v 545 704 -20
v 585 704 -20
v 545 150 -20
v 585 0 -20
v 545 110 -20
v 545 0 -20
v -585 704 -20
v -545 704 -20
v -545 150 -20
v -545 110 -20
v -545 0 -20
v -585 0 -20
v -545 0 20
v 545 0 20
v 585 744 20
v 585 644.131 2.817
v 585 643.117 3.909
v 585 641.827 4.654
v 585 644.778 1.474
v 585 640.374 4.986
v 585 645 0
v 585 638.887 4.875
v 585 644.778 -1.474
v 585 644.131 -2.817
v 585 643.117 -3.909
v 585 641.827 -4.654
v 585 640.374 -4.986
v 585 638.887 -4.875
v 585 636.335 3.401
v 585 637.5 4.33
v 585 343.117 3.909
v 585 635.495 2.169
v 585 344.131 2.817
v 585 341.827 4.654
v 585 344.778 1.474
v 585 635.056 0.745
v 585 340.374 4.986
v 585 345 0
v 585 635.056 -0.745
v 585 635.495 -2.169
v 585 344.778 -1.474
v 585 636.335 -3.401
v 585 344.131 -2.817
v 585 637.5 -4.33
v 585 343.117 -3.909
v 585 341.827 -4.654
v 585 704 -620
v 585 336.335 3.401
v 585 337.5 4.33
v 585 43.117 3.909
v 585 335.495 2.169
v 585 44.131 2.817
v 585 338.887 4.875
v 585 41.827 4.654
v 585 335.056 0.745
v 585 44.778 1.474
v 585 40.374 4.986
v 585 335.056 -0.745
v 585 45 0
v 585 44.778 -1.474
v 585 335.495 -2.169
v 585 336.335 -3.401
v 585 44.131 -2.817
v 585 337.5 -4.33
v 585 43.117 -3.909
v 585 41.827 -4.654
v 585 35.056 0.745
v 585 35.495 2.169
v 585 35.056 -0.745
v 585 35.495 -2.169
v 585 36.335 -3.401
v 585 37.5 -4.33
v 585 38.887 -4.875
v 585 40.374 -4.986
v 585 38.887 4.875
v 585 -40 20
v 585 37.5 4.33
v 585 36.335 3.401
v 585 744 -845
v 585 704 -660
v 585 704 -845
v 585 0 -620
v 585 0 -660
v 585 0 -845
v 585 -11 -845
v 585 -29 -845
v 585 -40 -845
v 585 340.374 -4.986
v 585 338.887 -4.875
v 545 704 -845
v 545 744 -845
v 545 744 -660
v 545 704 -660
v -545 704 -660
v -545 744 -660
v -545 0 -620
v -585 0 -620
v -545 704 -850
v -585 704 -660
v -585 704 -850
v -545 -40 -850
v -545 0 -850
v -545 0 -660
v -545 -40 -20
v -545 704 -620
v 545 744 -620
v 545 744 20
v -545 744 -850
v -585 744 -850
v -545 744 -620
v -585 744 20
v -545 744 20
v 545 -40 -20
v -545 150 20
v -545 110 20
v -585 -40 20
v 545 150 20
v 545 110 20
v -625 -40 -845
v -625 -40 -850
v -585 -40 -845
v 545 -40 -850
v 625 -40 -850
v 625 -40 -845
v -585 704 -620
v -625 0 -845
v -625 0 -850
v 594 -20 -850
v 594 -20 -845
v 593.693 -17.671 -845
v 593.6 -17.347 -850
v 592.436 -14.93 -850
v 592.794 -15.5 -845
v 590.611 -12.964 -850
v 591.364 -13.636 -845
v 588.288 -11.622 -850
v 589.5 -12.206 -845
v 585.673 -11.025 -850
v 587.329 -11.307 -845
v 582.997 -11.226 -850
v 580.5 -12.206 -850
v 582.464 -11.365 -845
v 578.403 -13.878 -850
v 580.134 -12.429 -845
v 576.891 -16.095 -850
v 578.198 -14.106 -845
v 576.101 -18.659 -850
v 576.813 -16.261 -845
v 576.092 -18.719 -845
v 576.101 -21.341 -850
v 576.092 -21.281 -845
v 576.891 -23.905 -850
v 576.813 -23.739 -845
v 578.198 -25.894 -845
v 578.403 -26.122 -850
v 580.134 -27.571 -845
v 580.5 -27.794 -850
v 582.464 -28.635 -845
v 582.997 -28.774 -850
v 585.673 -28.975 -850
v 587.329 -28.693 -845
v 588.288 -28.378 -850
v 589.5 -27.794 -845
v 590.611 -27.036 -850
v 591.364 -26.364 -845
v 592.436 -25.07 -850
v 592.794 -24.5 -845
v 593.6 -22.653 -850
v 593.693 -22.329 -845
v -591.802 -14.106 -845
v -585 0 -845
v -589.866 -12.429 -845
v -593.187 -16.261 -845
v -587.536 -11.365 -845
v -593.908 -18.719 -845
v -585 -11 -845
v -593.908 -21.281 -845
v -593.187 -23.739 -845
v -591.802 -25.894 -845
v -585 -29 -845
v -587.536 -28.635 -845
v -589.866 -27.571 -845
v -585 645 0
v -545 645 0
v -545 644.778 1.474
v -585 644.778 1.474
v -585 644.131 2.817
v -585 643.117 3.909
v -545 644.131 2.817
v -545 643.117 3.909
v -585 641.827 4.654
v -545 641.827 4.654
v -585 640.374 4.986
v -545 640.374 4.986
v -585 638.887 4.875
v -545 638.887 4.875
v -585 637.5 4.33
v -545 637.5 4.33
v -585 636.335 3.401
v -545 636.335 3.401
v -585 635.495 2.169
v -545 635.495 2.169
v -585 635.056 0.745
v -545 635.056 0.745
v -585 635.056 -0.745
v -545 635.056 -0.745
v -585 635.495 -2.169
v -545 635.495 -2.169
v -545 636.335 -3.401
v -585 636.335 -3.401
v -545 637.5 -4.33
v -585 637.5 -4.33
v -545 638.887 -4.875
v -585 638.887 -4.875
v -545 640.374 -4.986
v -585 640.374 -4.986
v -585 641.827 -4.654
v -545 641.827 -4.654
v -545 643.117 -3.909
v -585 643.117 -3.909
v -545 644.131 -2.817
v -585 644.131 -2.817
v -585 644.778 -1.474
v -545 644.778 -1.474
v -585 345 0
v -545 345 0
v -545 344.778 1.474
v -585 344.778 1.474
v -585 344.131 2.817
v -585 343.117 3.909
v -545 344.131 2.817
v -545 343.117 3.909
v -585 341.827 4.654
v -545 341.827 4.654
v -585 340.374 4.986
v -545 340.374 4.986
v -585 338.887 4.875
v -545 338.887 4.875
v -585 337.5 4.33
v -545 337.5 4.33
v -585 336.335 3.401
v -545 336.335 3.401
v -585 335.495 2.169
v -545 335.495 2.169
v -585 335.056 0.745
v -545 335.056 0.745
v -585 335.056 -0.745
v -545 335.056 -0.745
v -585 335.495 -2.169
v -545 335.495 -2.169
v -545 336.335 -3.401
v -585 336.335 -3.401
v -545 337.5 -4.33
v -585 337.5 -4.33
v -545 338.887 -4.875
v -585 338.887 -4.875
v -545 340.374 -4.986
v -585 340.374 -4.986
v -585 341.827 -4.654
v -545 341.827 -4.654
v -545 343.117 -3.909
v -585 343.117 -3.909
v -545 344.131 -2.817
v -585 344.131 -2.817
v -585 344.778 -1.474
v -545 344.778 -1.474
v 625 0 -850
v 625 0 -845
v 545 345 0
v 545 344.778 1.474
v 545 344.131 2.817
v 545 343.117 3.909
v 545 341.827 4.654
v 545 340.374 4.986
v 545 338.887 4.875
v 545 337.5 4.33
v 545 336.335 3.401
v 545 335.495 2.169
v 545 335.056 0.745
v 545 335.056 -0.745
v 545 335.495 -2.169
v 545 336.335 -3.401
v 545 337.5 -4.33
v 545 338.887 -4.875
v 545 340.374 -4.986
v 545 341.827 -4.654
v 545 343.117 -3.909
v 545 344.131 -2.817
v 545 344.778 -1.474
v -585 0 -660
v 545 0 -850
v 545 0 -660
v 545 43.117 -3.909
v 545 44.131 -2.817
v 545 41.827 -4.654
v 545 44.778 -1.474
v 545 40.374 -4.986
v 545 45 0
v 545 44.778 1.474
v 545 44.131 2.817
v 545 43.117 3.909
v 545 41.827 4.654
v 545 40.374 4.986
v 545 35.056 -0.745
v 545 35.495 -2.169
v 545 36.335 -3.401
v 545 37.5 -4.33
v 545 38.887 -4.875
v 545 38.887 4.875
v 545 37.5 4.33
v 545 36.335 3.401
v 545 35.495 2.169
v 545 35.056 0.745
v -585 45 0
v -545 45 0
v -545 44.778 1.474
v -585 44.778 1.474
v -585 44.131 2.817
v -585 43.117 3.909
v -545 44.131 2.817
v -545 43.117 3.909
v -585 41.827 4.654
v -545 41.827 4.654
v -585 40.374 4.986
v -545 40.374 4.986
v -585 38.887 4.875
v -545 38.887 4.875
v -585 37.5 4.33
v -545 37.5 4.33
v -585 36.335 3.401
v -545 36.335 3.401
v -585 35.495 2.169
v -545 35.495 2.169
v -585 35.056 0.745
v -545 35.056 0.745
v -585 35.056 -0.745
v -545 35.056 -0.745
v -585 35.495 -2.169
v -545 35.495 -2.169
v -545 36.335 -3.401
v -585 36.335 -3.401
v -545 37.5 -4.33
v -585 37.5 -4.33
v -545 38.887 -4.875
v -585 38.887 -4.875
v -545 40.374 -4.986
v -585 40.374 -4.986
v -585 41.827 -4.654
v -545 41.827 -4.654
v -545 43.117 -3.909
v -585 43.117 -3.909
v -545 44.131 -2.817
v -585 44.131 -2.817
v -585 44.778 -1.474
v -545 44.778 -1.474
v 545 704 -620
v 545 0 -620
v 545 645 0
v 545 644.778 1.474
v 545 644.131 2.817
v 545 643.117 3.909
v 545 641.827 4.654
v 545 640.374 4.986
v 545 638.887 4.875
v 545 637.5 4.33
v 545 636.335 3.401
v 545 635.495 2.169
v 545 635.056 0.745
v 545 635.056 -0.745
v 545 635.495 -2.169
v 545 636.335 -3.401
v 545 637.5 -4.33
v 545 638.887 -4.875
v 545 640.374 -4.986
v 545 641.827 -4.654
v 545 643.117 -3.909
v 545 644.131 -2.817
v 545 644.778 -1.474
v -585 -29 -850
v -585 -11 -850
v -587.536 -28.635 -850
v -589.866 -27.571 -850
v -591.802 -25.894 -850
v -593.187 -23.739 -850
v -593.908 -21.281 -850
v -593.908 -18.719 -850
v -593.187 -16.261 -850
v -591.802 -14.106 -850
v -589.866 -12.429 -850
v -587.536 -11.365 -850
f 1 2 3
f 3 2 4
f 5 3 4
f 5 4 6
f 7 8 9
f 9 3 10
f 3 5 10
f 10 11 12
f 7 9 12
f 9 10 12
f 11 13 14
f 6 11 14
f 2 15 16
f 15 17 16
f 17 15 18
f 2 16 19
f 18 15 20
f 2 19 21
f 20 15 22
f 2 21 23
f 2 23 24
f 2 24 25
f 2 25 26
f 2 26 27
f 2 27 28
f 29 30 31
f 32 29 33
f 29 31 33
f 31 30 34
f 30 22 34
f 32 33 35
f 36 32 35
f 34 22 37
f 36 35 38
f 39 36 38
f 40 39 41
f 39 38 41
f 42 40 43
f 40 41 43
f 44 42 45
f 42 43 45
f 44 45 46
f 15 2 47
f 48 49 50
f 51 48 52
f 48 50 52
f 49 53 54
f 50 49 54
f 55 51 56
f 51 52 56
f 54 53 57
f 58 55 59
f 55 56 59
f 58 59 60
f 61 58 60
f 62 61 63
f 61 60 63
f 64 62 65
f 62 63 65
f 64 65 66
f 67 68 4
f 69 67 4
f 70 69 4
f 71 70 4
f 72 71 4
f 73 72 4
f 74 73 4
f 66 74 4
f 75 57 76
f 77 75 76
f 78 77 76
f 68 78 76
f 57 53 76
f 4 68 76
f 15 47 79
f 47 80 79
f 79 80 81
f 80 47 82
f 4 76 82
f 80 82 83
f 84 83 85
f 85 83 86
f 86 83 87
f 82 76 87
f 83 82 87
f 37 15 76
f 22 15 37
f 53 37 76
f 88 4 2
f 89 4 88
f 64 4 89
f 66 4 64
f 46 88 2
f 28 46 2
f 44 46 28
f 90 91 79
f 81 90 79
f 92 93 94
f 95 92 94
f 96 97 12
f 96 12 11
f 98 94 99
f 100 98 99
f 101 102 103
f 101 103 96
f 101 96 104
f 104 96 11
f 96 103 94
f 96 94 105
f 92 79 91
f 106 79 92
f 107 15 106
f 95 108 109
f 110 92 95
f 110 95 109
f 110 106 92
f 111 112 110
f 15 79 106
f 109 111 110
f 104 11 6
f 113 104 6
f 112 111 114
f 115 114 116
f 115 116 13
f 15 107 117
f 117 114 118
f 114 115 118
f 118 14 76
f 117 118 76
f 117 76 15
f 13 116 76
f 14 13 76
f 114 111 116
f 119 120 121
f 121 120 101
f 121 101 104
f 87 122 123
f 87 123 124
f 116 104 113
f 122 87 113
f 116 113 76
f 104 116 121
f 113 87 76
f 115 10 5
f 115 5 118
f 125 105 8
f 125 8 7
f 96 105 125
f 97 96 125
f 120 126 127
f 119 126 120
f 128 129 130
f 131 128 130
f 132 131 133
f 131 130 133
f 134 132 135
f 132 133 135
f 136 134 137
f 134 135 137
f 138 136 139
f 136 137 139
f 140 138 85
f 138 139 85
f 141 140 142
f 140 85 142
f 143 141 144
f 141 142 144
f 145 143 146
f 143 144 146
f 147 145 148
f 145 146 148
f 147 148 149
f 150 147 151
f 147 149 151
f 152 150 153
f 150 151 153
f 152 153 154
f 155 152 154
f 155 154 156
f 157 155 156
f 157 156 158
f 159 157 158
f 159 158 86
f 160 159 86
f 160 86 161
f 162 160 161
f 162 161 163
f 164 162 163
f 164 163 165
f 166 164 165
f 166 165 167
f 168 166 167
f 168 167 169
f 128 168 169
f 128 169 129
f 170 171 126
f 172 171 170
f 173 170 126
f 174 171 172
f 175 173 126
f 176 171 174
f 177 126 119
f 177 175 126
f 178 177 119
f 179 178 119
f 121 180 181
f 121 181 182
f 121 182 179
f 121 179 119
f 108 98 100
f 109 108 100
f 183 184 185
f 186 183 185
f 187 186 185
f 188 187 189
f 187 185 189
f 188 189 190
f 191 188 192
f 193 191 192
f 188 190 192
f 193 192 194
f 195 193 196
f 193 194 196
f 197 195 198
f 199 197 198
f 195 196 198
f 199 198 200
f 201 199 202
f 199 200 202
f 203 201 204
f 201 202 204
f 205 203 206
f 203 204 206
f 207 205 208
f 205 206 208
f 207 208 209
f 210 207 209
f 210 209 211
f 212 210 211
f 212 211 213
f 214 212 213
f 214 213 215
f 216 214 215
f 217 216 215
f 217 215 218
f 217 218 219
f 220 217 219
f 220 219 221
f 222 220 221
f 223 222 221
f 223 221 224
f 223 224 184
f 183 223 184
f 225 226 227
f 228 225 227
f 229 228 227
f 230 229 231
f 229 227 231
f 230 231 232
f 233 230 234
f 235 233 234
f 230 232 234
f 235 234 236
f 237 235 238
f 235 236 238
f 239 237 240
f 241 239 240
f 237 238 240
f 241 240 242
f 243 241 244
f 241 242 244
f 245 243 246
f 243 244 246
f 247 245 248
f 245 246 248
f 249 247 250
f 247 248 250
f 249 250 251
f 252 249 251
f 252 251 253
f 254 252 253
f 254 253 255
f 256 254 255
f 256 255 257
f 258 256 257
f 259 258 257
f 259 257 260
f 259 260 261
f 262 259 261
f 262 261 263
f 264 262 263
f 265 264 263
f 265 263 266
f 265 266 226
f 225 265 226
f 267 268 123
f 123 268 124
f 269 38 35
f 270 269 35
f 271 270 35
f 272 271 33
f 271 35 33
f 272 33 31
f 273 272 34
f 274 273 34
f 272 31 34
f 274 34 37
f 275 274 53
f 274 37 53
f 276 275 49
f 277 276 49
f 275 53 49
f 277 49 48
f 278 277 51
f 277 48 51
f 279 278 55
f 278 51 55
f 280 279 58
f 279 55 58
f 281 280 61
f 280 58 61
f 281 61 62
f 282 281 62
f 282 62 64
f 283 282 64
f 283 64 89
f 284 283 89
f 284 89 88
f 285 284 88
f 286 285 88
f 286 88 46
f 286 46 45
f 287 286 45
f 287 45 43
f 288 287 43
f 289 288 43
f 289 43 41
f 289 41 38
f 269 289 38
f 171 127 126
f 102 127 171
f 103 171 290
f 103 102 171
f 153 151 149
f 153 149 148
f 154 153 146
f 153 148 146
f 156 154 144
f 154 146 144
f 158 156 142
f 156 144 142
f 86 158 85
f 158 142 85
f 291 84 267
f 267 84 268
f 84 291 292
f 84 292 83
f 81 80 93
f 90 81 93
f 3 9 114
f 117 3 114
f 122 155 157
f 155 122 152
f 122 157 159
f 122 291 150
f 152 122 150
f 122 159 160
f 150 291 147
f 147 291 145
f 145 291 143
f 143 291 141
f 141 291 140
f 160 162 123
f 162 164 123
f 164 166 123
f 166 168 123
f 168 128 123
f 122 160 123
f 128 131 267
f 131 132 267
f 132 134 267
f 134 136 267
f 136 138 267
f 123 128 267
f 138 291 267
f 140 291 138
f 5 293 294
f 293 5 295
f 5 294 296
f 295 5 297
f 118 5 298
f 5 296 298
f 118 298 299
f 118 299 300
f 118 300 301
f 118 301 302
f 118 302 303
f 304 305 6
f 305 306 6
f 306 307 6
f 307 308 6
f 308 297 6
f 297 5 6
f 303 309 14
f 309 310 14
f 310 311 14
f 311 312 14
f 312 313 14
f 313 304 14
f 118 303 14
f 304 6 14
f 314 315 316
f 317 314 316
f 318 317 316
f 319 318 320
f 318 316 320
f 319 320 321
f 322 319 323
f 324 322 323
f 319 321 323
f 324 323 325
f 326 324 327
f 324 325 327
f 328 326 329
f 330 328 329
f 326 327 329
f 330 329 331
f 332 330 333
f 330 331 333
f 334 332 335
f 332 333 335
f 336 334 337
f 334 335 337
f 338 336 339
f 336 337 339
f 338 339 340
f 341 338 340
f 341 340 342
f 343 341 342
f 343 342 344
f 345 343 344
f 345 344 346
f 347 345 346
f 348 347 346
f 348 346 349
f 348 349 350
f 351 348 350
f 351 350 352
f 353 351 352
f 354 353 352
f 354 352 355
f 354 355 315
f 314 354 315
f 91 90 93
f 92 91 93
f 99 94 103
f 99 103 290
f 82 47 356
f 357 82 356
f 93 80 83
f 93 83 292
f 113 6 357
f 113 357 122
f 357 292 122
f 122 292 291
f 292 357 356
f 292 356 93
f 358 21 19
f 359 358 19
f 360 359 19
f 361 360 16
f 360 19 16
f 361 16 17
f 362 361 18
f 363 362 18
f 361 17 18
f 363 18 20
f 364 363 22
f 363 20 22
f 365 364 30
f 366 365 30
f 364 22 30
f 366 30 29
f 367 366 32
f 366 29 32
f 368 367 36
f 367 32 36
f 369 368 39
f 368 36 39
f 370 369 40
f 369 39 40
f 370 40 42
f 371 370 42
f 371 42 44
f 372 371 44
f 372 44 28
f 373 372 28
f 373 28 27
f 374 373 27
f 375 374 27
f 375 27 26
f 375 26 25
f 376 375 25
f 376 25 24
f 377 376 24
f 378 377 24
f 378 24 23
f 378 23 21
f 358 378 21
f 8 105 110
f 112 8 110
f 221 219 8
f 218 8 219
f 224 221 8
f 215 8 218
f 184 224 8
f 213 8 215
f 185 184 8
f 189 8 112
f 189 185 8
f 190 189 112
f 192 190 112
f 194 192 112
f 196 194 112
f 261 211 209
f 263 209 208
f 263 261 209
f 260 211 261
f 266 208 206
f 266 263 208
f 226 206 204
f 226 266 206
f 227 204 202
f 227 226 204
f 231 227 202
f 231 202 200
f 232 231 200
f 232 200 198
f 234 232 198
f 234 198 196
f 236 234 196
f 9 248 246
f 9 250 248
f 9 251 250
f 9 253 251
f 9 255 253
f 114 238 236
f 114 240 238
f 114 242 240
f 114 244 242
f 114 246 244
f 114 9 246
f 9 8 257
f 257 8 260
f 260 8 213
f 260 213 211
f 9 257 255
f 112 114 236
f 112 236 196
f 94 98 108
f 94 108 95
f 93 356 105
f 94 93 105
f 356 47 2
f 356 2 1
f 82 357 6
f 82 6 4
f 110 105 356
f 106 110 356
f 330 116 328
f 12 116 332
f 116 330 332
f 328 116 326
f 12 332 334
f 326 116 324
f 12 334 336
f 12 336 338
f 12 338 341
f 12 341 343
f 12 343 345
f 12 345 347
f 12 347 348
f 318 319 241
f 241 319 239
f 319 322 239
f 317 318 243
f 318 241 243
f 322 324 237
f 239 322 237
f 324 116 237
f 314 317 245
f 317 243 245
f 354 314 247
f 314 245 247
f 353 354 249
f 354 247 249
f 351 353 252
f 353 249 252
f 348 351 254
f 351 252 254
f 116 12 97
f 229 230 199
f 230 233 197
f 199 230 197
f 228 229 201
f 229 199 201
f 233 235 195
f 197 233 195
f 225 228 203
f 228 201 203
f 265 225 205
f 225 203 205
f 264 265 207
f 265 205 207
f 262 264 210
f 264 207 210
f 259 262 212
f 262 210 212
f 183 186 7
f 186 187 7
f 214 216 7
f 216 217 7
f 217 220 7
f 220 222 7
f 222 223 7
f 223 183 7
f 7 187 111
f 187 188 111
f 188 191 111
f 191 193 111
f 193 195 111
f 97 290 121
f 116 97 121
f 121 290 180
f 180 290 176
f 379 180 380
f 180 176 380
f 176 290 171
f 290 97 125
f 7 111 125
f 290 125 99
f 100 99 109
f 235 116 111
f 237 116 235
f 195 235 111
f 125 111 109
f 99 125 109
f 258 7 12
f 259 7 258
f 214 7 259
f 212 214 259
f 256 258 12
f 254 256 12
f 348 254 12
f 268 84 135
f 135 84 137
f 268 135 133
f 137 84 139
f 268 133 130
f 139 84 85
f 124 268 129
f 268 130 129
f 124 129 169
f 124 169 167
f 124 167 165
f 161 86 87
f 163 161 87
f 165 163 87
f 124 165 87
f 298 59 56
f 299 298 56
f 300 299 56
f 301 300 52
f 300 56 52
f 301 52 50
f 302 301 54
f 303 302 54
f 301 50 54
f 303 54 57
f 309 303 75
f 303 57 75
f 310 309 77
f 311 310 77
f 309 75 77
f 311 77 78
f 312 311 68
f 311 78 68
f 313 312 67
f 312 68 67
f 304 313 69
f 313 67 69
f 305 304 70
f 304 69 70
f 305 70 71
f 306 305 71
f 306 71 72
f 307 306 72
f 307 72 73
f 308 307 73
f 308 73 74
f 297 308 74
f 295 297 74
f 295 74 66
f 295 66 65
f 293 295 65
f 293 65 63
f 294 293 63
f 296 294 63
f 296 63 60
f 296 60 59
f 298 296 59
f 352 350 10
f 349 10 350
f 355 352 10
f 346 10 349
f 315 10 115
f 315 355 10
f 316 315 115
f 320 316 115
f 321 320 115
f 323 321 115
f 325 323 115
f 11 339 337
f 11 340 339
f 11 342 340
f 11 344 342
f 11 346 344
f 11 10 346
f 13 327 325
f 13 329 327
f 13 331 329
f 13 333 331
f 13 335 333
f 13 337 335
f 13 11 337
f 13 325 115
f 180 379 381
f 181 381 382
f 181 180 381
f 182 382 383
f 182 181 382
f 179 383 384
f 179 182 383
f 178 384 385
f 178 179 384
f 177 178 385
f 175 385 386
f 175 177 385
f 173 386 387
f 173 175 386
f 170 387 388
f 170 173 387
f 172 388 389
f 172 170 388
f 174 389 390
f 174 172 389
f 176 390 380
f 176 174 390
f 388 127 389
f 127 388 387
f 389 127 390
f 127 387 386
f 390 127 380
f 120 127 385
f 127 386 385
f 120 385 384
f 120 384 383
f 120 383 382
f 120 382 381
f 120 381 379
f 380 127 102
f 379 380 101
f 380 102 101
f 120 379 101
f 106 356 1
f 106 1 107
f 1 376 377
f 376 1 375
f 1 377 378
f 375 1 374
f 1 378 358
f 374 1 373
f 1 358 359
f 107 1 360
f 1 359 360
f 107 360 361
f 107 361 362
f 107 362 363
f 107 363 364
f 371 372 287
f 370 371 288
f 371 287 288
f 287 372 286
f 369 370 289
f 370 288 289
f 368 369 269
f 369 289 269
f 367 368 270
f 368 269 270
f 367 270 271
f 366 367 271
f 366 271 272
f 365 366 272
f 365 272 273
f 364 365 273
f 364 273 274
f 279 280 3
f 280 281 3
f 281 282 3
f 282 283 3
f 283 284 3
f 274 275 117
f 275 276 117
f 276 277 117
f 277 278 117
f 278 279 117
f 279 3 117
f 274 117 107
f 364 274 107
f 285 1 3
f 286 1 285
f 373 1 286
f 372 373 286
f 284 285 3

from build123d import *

# Parameters (mm, degrees)
F1_DEPTH  = 40
F2_W      = 40
F2_H      = 40
F3_DEPTH  = 704
F4_W      = 1090
F4_H      = 40
F4_W_2    = 40
F4_H_2    = 640
F4_H_3    = 190
F5_DEPTH  = 40
F6_W      = 40
F6_H      = 5
F7_DEPTH  = 80
F8_R      = 9
F7_FACE_W = 80
F7_FACE_H = 40
F9_DEPTH  = 30
F11_W     = 40
F11_H     = 40
F12_DEPTH = 1090
F13_R     = 5
F14_DEPTH = 1170


with BuildPart() as f1:
    # F0 (on Front) → F1 (new body)
    with BuildSketch(Plane.XZ):
        Polygon((-585, 20), (-585, -20), (-545, -20), (545, -20), (585, -20), (585, 20), align=None)
        Polygon((-545, -20), (-585, -20), (-585, -850), (-545, -850), (-545, -660), (-545, -620), align=None)
        Polygon((585, -20), (545, -20), (545, -620), (545, -660), (545, -850), (585, -850), align=None)
    extrude(amount=F1_DEPTH)

    # F2 (on face) → F3 (join)
    with BuildSketch(Plane(origin=(0, 0, 0), x_dir=(-1, 0, 0), z_dir=(0, 1, 0))):
        with Locations((-565, 0)):
            Rectangle(F2_W, F2_H)
        with Locations((565, 0)):
            Rectangle(F2_W, F2_H)
        with Locations((-565, -640)):
            Rectangle(F2_W, F2_H)
        with Locations((565, -640)):
            Rectangle(F2_W, F2_H)
    extrude(amount=F3_DEPTH)

    # F4 (on face) → F5 (join)
    with BuildSketch(Plane(origin=(0, 704, 0), x_dir=(-1, 0, 0), z_dir=(0, 1, 0))):
        Polygon((-545, 20), (-585, 20), (-585, -850), (-545, -850), (-545, -660), (-545, -620), align=None)
        with Locations((0, -640)):
            Rectangle(F4_W, F4_H)
        with Locations((565, -640)):
            Rectangle(F4_W_2, F4_H)
        with Locations((565, -300)):
            Rectangle(F4_W_2, F4_H_2)
        with Locations((565, -755)):
            Rectangle(F4_W_2, F4_H_3)
    extrude(amount=F5_DEPTH)


with BuildPart() as f7:
    # F6 (on face) → F7 (new body)
    with BuildSketch(Plane(origin=(545, 0, 0), x_dir=(0, -1, 0), z_dir=(-1, 0, 0))):
        with Locations((20, -847.5)):
            Rectangle(F6_W, F6_H)
    extrude(amount=-F7_DEPTH)


with BuildPart() as f7b:
    # F6 (on face) → F7, piece 2 (new body)
    with BuildSketch(Plane(origin=(545, 0, 0), x_dir=(0, -1, 0), z_dir=(-1, 0, 0))):
        with Locations((-724, -847.5)):
            Rectangle(F6_W, F6_H)
    extrude(amount=-F7_DEPTH)


with BuildPart() as f9_tool:
    # F8 (on face) + F7_face (on face) → F9 (new body)
    with BuildSketch(Plane.XY.offset(-845)):
        with Locations((585, -20)):
            Circle(F8_R)
    with BuildSketch(Plane(origin=(585, -20, -845), x_dir=(1, 0, 0), z_dir=(0, 0, 1))):
        with Locations((0, 744)):
            Rectangle(F7_FACE_W, F7_FACE_H)
    extrude(amount=-F9_DEPTH)


with BuildPart() as f1_1:
    add(f1.part)

    # F9: cut by f9_tool
    add(f9_tool.part, mode=Mode.SUBTRACT)

    # F10: F7 across plane


with BuildPart() as f7_1:
    add(f7.part)

    # F9: cut by f9_tool
    add(f9_tool.part, mode=Mode.SUBTRACT)


with BuildPart() as f7b_1:
    add(f7b.part)

    # F9: cut by f9_tool
    add(f9_tool.part, mode=Mode.SUBTRACT)


with BuildPart() as f1_2:
    add(f1_1.part)
    add(f7_1.part.mirror(Plane.YZ))


    add(f7_1.part)  # F12 merges F7
    # F11 (on face) → F12 (join, through all)
    with BuildSketch(Plane.YZ.offset(-545)):
        with Locations((130, 0)):
            Rectangle(F11_W, F11_H)
    extrude(amount=F12_DEPTH)

    # F13 (on face) → F14 (cut, through all)
    with BuildSketch(Plane.YZ.offset(585)):
        with Locations((340, 0)):
            Circle(F13_R)
        with Locations((640, 0)):
            Circle(F13_R)
        with Locations((40, 0)):
            Circle(F13_R)
    extrude(amount=-F14_DEPTH, mode=Mode.SUBTRACT)


solid = f1_2.part
